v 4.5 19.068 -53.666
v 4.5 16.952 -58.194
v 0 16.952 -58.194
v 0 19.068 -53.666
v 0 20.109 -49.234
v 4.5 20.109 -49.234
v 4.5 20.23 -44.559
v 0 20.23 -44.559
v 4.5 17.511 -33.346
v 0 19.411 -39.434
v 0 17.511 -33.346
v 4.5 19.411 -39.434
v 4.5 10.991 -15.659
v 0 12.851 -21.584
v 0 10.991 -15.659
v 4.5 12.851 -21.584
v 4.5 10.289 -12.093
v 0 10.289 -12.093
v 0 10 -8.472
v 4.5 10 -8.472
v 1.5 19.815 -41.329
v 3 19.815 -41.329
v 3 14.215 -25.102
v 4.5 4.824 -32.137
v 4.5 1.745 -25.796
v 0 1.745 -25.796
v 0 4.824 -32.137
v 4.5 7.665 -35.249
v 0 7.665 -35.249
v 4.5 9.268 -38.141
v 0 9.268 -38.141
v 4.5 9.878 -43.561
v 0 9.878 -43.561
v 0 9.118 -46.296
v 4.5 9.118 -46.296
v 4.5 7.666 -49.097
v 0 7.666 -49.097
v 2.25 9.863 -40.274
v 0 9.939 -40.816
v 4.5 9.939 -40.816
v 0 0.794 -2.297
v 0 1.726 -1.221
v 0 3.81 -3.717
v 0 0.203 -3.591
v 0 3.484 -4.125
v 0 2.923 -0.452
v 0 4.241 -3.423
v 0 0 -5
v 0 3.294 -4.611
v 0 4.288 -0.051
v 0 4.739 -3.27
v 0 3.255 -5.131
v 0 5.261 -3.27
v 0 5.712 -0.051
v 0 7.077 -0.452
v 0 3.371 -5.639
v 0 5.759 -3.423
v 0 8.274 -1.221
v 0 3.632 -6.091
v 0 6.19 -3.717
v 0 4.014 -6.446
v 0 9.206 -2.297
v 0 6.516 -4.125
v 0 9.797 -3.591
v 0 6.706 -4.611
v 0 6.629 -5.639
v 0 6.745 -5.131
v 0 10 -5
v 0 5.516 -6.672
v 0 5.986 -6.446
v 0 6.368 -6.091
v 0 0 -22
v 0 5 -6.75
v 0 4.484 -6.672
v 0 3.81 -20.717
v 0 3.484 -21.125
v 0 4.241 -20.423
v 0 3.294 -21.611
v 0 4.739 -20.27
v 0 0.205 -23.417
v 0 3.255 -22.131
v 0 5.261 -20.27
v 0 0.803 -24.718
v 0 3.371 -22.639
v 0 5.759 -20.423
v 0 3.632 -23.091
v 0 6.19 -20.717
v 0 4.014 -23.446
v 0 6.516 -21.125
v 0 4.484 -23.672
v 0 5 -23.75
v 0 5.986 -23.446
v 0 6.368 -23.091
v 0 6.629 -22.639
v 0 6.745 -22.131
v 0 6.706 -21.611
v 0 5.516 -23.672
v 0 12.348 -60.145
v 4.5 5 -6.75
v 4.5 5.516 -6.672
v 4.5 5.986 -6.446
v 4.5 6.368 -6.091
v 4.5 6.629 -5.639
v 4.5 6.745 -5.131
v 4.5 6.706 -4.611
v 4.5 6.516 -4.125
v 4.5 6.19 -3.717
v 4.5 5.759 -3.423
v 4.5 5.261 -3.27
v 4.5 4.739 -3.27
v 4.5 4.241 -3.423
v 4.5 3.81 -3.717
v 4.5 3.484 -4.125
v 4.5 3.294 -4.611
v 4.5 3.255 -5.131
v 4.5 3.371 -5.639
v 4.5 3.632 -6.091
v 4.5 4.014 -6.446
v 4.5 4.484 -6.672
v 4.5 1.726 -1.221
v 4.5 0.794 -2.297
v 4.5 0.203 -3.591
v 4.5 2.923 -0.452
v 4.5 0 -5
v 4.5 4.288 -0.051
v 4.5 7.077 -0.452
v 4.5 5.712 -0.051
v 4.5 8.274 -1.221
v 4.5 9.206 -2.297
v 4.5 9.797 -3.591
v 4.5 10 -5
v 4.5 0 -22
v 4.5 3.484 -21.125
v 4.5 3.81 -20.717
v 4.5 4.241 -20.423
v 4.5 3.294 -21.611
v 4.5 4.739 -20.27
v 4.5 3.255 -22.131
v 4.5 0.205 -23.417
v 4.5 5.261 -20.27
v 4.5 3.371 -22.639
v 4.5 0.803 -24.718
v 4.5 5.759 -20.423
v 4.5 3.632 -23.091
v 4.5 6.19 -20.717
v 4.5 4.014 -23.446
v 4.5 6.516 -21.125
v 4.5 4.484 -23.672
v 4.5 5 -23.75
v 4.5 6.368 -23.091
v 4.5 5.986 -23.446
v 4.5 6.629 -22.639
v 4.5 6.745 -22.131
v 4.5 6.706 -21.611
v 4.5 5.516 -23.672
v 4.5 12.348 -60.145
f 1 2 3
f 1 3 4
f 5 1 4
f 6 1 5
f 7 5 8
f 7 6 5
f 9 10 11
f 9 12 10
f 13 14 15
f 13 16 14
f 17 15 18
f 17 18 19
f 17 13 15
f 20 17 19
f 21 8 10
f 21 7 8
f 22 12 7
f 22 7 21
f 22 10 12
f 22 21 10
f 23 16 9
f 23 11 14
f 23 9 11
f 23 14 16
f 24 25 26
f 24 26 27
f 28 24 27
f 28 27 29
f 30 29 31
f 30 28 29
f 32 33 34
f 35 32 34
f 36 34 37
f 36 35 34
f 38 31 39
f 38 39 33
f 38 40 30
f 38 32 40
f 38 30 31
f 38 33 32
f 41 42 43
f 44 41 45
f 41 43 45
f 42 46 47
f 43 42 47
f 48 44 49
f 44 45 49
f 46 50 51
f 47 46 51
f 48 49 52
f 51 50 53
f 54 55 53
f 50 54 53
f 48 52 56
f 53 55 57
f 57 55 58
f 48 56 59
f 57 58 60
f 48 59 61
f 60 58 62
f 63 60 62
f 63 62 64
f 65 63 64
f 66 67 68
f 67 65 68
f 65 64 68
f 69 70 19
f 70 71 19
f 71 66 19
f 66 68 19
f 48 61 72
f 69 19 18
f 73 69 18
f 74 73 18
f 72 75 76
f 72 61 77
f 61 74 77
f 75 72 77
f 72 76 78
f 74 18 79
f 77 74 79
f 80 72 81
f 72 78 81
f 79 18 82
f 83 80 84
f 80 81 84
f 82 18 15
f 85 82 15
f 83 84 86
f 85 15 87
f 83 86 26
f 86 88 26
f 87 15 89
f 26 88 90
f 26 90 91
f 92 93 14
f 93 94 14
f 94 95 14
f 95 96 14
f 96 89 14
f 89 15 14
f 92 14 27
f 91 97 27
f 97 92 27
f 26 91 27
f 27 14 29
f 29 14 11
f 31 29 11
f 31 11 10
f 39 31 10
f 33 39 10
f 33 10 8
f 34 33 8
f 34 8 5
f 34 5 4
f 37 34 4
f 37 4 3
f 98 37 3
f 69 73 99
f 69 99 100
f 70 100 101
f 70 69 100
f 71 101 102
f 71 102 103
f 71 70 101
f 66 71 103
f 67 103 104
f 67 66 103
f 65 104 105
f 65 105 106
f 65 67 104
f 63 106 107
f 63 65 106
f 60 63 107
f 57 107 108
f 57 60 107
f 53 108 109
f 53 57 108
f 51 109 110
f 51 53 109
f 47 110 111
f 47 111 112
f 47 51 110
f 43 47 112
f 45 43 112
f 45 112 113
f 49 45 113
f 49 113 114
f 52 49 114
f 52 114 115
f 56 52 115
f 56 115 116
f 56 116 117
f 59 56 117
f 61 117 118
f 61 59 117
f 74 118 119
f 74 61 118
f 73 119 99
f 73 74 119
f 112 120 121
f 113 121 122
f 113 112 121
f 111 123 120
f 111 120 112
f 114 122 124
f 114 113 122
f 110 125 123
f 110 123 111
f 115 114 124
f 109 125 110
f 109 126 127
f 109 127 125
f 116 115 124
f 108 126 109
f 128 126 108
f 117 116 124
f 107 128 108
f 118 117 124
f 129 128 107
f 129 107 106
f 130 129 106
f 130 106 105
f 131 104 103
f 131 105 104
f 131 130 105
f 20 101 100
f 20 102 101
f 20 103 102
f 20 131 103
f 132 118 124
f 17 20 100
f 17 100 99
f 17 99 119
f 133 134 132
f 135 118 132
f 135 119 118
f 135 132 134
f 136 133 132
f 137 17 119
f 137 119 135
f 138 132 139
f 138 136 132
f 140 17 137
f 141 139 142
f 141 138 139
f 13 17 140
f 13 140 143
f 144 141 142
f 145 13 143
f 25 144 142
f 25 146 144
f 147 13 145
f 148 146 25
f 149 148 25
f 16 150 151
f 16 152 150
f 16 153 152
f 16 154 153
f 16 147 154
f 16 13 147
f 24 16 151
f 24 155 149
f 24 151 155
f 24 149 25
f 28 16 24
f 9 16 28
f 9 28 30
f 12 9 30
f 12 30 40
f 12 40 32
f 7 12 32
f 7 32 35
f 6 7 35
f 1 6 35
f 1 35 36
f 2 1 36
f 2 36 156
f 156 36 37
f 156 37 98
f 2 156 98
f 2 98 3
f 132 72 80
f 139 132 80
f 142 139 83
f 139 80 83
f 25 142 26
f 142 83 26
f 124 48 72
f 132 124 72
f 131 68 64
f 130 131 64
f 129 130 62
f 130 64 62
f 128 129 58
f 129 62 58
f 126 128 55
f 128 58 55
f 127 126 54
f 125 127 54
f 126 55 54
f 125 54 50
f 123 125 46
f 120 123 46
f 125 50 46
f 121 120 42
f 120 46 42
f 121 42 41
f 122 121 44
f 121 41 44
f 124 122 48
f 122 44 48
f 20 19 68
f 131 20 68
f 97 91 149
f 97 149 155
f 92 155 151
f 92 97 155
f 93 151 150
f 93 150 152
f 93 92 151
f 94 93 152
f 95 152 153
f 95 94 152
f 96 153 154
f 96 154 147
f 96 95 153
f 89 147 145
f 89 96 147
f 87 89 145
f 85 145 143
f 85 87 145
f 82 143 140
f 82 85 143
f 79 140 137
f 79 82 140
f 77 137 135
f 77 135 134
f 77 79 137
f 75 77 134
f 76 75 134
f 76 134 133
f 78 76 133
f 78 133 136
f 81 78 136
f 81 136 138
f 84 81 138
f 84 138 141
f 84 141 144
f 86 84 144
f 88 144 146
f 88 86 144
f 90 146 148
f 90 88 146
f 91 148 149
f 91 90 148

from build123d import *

# Parameters (mm, degrees)
SKETCH1_R           = 1.75
BOSS_EXTRUDE1_DEPTH = 4.5
BOSS_EXTRUDE2_DEPTH = 4.5


with BuildPart() as part:
    # Sketch1 → Boss-Extrude1 (new body)
    with BuildSketch(Plane(origin=(0, 0, 0), x_dir=(0, 0, -1), z_dir=(1, 0, 0))):
        with BuildLine():
            Line((22, 10), (5, 10))
            ThreePointArc((5, 10), (0, 5), (5, 0))
            Line((5, 0), (22, 0))
            ThreePointArc((22, 0), (27, 5), (22, 10))
        make_face()
        with Locations((5, 5)):
            Circle(SKETCH1_R, mode=Mode.SUBTRACT)
        with Locations((22, 5)):
            Circle(SKETCH1_R, mode=Mode.SUBTRACT)
    extrude(amount=BOSS_EXTRUDE1_DEPTH)

    # Sketch2 → Boss-Extrude2 (add)
    with BuildSketch(Plane(origin=(4.5, 0, 5.948752288), x_dir=(0, 0, -1), z_dir=(1, 0, 0))):
        with BuildLine():
            add(Edge.make_bspline(
                [(64.143181637, 16.951696957), (46.3659084, 27.475135201), (31.177283873, 9.75391621), (13.694974759, 10)],
                knots=[0, 0, 0, 0, 1, 1, 1, 1], degree=3))
            Line((13.694974759, 10), (26.999543269, 9.812722758))
            ThreePointArc((26.999543269, 9.812722758), (31.550747241, 5.770381866), (28.824655416, 0.327735373))
            Line((28.824655416, 0.327735373), (38.08542066, 4.824084077))
            add(Edge.make_bspline(
                [(38.08542066, 4.824084077), (45.879227883, 13.481709162), (55.04551447, 7.665553941)],
                knots=[0, 0, 0, 1, 1, 1], degree=2))
            Line((55.04551447, 7.665553941), (66.094228393, 12.348066156))
            Line((66.094228393, 12.348066156), (64.143181637, 16.951696957))
        make_face()
    extrude(amount=-BOSS_EXTRUDE2_DEPTH)


solid = part.part
